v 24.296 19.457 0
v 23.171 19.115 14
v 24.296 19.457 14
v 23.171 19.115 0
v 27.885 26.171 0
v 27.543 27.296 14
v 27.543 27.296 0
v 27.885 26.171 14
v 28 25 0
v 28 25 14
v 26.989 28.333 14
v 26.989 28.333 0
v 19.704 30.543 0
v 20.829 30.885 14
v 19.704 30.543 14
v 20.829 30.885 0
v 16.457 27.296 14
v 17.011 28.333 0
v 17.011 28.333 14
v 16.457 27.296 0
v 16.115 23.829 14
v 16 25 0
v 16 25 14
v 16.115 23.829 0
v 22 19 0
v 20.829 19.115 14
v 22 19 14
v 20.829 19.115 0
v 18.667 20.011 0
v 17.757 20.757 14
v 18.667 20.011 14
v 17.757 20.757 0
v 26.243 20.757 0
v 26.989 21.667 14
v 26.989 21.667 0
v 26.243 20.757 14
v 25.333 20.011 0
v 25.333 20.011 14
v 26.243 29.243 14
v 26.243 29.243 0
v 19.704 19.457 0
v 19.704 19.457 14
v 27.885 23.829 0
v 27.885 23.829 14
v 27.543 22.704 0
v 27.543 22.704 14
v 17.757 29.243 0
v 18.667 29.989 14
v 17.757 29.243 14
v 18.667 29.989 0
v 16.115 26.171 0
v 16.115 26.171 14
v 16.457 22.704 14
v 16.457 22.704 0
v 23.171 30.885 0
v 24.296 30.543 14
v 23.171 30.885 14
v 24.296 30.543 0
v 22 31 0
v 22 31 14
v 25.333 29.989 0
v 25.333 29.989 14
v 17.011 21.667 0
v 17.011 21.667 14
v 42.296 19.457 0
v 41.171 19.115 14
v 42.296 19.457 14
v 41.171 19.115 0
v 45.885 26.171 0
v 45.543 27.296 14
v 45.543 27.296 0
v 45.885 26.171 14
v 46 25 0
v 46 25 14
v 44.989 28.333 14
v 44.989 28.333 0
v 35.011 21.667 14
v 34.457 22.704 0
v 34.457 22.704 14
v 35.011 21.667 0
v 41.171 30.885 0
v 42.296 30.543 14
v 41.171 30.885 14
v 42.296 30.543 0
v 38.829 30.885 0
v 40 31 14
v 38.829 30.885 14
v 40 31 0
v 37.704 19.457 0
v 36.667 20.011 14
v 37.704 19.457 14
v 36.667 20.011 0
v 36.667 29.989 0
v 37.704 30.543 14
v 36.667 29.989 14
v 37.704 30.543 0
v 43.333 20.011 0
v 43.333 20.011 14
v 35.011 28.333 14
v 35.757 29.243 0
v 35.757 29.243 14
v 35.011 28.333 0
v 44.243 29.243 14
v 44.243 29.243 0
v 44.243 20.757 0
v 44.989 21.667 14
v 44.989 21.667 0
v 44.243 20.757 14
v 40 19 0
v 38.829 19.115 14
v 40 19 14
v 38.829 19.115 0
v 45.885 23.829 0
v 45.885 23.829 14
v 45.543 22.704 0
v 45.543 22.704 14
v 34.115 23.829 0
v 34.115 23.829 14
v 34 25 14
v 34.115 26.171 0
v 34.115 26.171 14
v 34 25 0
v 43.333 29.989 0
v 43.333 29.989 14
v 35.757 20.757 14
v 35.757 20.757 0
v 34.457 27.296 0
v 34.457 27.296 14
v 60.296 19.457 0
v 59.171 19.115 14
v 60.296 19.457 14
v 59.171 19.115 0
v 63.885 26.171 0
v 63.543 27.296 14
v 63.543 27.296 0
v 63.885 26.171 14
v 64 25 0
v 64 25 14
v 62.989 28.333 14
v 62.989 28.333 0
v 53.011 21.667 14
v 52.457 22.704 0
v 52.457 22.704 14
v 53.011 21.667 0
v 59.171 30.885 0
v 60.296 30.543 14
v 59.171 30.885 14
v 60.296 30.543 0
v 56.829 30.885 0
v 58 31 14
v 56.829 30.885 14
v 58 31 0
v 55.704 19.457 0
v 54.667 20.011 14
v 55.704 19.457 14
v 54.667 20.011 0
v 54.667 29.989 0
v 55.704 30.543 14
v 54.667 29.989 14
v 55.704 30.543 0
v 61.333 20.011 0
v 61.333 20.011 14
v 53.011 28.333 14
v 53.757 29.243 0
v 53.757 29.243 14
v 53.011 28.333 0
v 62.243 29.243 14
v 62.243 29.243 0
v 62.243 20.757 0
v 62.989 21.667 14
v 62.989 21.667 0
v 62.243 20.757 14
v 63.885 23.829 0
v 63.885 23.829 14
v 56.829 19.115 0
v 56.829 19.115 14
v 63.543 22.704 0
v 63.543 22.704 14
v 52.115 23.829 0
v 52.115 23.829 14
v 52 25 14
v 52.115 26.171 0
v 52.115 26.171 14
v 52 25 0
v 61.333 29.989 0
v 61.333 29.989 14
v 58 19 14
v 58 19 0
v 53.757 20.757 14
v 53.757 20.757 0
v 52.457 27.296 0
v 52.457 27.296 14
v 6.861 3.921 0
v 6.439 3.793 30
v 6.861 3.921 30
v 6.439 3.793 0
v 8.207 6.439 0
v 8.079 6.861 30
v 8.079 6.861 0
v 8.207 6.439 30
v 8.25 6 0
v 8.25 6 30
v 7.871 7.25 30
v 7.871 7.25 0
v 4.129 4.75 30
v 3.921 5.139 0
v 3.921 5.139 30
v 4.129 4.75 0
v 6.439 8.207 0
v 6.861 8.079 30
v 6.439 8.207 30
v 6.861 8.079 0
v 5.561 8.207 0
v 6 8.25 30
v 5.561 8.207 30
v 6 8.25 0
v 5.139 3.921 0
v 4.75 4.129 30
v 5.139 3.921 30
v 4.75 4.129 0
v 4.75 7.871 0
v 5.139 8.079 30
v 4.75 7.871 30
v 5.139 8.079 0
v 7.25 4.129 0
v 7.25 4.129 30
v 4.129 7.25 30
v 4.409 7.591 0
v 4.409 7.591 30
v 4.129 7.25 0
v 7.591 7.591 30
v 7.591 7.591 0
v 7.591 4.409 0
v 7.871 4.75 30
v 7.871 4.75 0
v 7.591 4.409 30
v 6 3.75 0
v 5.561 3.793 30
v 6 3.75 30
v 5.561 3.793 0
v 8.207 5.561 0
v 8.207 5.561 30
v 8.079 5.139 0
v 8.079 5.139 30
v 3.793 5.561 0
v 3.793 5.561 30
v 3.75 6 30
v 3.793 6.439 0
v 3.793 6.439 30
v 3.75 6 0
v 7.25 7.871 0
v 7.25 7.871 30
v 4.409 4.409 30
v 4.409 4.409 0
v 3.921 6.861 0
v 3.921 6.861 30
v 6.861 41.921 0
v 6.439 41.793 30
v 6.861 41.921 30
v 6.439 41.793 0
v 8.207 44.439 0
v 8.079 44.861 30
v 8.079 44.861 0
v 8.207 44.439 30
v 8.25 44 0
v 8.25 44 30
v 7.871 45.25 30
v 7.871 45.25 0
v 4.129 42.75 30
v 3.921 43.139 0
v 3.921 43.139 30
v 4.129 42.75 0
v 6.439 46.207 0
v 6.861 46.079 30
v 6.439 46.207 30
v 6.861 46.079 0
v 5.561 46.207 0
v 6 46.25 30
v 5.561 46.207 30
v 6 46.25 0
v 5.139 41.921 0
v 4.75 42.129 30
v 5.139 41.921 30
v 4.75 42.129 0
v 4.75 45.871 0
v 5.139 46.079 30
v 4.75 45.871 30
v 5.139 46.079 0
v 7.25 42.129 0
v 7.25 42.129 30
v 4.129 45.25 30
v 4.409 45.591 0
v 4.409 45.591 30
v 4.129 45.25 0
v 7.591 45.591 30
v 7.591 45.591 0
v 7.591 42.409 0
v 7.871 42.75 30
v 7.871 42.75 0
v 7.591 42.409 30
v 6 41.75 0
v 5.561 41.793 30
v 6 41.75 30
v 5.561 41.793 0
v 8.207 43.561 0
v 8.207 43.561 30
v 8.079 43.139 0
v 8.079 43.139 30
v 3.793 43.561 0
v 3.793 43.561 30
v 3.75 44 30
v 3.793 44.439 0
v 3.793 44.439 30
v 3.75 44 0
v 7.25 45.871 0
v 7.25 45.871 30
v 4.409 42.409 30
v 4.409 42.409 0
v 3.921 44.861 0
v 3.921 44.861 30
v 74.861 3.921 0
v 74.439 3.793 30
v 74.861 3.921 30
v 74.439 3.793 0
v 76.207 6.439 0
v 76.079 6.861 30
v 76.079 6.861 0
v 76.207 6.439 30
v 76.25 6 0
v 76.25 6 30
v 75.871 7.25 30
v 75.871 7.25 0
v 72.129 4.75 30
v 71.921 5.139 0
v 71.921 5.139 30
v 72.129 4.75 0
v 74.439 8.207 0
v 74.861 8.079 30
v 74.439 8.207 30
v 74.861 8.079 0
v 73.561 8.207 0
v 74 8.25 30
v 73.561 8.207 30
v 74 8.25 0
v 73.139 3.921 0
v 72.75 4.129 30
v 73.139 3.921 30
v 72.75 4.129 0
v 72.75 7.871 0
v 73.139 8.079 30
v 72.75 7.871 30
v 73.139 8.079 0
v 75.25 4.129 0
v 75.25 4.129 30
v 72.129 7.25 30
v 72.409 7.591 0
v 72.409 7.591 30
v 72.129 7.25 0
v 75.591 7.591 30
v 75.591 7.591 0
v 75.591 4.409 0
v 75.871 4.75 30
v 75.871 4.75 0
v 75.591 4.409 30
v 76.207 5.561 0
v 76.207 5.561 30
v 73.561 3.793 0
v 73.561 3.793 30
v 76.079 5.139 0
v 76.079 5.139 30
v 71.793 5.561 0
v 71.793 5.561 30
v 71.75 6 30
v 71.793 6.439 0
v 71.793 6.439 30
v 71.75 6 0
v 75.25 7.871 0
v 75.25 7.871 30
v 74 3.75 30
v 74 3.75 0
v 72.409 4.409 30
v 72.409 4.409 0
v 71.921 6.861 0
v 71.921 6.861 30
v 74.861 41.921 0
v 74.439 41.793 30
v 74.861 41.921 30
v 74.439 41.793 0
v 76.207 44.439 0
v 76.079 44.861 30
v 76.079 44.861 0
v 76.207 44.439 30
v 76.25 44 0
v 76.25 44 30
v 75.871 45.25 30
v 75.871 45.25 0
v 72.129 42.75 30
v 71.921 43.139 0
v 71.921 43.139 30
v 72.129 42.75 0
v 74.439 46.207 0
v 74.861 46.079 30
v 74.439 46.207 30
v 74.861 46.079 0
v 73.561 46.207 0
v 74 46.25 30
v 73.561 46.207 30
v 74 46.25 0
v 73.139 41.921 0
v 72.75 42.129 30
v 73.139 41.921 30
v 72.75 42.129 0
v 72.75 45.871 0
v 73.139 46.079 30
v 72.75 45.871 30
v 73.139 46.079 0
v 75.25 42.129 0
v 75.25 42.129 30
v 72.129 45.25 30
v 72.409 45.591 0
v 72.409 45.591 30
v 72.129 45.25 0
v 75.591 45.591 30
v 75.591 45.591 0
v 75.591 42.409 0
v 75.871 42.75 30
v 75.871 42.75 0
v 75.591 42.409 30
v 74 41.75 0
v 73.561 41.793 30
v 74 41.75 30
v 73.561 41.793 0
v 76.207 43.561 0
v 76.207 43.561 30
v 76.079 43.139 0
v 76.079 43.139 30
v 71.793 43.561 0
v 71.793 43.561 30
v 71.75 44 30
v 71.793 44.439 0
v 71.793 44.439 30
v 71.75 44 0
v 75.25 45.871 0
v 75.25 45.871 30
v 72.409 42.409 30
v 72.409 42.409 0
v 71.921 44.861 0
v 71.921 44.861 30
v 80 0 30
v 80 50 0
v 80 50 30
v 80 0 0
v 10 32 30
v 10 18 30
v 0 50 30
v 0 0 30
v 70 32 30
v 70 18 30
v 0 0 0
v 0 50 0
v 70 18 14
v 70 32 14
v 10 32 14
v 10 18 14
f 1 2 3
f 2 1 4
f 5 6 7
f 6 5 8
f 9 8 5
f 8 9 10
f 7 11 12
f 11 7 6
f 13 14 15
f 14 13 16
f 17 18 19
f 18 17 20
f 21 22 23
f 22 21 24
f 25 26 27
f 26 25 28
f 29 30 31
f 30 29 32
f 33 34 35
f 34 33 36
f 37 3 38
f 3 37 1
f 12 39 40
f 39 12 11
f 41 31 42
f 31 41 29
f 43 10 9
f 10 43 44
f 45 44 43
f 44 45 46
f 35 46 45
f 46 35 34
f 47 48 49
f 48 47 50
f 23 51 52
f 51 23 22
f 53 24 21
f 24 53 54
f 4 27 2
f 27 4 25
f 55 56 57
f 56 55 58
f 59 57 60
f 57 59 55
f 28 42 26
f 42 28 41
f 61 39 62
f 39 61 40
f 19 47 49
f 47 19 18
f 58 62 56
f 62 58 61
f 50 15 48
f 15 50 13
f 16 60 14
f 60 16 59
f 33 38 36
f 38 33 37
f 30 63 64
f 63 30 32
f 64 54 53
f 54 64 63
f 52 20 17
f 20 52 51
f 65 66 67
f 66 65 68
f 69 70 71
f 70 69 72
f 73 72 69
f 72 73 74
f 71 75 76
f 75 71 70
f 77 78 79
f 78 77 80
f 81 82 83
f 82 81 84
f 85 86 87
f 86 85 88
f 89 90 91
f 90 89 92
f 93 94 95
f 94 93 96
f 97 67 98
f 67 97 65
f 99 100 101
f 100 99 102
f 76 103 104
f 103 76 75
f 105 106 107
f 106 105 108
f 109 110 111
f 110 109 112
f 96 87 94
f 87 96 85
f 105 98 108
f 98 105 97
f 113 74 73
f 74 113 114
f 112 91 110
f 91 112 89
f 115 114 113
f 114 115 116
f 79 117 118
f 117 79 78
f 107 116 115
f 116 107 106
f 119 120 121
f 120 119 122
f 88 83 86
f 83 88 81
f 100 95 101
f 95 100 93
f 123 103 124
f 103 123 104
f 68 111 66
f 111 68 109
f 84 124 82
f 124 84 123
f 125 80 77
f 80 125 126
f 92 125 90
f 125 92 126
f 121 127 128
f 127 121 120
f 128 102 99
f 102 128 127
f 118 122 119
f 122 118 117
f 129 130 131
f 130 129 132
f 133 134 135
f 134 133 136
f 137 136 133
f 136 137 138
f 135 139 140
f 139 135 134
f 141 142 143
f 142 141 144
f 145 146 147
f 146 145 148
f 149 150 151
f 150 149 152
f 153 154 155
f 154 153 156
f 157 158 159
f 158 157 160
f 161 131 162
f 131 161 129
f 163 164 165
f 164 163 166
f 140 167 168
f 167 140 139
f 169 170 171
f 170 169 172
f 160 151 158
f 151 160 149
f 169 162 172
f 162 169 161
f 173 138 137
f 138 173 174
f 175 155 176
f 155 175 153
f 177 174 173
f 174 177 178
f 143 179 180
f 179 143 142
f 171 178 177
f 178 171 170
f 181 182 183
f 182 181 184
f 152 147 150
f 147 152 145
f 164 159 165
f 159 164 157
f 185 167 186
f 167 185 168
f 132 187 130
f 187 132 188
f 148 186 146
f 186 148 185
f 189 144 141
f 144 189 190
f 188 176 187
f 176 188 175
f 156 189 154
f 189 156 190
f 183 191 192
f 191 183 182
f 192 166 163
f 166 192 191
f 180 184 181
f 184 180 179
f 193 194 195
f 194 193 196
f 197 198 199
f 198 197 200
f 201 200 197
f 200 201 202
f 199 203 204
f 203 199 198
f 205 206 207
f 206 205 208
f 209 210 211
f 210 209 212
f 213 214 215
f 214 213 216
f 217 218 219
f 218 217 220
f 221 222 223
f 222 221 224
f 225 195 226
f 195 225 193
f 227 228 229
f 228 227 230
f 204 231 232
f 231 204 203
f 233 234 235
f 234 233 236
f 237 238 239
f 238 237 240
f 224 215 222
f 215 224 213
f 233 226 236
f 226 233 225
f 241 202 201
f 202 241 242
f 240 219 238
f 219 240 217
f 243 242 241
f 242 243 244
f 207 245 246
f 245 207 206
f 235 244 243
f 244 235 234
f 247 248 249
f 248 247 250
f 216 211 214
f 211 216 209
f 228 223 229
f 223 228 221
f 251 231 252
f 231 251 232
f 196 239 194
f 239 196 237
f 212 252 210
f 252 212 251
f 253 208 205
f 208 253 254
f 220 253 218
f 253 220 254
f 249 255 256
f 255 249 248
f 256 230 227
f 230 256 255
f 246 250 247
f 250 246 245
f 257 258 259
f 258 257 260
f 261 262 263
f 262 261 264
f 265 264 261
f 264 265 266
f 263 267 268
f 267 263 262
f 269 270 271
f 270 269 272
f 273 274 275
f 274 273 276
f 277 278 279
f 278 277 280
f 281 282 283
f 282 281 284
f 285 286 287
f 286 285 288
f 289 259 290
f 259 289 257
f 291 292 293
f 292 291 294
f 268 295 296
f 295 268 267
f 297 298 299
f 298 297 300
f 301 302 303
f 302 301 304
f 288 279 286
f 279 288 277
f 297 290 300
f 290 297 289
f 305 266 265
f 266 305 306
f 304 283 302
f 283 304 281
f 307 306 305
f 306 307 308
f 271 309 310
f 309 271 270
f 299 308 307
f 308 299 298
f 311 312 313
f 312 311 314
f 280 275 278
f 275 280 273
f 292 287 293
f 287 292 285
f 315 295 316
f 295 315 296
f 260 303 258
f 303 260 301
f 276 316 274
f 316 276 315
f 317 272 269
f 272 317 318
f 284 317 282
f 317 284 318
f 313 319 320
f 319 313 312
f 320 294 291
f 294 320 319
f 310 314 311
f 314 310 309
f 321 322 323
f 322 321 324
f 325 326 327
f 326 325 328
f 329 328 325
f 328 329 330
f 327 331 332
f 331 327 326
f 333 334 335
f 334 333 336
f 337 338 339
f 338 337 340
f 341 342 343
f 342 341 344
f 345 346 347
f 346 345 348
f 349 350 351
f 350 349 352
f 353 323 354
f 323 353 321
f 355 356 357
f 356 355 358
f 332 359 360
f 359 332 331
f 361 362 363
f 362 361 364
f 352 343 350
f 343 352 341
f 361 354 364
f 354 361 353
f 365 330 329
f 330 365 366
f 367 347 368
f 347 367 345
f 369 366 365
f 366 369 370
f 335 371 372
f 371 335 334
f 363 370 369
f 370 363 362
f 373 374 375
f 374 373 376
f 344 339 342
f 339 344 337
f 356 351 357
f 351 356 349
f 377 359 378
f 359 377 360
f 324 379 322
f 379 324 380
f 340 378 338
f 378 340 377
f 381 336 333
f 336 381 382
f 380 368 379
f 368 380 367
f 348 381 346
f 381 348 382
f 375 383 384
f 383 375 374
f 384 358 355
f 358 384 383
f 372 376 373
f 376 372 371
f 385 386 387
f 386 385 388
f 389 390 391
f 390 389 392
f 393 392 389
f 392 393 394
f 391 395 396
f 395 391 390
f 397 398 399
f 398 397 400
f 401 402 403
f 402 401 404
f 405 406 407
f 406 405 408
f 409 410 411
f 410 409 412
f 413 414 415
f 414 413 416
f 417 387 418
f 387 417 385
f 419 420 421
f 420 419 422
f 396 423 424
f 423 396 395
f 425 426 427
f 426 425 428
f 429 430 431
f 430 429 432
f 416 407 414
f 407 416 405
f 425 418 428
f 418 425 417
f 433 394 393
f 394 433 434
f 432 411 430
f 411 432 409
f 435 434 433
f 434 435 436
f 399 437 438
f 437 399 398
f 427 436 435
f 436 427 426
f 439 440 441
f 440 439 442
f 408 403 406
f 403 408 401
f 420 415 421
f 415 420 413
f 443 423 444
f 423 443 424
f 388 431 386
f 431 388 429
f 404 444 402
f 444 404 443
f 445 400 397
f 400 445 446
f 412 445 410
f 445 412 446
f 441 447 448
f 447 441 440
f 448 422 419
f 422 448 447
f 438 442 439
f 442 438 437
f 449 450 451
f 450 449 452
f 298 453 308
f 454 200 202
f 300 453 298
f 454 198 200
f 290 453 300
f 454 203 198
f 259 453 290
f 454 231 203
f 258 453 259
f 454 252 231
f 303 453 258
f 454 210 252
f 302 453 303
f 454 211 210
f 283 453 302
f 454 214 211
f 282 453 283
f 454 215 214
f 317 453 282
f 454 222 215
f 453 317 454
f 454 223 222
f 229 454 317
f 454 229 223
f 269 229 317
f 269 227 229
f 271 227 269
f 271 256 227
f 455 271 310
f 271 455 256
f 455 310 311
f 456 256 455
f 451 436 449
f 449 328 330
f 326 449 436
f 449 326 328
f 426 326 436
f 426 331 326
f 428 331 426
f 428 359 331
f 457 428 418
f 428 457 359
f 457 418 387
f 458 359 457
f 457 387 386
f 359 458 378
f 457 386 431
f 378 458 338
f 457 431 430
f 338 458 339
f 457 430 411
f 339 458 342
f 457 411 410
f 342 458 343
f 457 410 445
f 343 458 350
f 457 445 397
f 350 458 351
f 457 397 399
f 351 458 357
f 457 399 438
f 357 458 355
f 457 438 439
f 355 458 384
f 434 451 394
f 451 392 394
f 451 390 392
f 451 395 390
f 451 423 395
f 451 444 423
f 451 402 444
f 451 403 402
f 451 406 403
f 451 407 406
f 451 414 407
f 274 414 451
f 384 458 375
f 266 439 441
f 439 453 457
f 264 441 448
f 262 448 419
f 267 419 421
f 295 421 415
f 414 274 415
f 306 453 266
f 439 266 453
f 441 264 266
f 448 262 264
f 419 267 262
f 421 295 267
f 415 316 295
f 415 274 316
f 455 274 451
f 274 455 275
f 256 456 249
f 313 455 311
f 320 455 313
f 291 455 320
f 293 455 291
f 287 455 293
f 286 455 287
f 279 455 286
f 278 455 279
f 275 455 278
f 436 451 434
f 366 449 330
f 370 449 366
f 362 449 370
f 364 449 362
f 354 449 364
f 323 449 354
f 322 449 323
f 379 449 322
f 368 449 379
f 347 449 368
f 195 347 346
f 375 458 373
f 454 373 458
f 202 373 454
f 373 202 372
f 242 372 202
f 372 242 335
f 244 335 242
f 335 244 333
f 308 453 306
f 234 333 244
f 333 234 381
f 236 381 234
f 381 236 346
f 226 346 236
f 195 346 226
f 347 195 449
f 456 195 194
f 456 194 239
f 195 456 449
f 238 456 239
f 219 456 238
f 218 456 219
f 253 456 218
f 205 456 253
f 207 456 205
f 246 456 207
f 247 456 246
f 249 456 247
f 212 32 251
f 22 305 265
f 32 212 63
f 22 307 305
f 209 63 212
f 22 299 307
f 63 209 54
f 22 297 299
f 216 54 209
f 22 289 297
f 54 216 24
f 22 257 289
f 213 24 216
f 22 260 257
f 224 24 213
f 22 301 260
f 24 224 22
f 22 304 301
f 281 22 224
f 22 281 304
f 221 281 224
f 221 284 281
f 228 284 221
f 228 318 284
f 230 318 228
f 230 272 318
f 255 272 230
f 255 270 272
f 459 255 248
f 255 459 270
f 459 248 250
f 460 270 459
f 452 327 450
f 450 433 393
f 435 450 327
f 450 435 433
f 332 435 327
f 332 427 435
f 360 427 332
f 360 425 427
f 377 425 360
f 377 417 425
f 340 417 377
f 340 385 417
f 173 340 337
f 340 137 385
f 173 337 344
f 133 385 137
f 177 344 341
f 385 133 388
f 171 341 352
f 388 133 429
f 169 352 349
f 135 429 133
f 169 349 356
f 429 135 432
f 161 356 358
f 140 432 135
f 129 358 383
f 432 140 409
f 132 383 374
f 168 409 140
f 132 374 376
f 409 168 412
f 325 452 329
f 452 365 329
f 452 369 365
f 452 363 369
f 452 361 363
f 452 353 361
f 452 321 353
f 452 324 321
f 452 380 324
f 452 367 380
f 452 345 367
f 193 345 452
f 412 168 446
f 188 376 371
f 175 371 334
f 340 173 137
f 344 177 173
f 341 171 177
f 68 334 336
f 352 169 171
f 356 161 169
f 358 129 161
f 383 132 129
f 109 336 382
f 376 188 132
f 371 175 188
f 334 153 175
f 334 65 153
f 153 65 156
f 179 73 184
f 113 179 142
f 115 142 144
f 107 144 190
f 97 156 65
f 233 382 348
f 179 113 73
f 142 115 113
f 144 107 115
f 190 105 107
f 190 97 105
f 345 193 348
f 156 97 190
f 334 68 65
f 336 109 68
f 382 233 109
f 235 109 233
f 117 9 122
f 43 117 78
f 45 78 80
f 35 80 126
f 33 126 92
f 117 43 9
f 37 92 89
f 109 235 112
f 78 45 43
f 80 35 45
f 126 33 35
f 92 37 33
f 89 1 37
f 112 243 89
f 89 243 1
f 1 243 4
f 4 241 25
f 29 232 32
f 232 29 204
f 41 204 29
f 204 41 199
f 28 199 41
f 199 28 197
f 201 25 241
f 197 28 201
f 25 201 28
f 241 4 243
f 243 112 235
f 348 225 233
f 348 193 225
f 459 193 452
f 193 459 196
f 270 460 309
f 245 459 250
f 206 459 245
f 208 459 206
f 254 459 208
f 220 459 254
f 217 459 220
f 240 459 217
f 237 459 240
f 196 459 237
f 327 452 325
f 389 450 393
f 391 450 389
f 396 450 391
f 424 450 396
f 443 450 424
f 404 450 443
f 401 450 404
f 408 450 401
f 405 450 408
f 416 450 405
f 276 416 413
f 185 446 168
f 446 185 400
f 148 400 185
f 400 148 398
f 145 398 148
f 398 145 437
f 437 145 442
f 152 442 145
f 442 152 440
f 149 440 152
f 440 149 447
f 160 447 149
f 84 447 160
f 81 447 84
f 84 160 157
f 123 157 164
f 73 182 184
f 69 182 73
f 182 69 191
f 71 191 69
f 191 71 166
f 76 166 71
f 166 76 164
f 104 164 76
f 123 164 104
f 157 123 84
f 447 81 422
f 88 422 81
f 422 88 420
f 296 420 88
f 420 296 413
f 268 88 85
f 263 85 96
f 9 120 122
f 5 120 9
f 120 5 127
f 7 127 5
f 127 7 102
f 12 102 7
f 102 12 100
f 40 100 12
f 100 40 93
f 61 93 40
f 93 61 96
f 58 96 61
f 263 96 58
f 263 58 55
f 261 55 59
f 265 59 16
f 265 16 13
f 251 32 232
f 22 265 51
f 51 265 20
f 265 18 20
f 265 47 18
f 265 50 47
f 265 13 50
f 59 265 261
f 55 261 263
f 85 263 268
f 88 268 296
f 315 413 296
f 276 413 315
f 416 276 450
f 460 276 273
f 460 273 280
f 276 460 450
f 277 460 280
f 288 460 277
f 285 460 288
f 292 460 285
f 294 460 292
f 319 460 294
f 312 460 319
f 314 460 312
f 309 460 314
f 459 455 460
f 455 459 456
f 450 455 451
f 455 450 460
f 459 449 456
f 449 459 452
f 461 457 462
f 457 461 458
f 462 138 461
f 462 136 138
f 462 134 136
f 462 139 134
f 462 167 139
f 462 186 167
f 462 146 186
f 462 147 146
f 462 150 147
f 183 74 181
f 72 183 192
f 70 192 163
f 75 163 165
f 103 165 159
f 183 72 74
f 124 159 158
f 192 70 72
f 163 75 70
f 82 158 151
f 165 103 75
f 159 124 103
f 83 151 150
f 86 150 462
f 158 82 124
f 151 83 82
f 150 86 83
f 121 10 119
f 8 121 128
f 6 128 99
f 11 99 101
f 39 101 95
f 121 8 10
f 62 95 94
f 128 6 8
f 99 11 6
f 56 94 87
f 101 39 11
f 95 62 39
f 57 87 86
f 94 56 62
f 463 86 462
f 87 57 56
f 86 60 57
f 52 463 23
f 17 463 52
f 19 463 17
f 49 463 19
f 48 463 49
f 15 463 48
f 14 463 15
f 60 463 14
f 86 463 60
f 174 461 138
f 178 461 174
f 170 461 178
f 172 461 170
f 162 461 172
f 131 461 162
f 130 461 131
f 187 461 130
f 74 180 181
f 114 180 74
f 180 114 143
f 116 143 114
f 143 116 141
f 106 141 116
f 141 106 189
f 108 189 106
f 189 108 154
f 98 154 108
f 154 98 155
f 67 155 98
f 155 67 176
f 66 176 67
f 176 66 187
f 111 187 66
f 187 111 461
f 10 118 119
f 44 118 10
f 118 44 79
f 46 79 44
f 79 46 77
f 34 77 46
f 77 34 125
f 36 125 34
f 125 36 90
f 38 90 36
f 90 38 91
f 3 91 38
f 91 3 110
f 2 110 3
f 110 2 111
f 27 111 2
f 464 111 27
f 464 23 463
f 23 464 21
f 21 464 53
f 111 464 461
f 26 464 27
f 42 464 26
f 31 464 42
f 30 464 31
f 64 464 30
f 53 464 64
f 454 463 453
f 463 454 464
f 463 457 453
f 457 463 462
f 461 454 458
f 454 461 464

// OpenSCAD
$fn = 32;

// ----------------------------------------------------------------------
// Manifold block: gallery_top manifold
// ----------------------------------------------------------------------

// --- parameters (mm) ---
block_l = 80;             // block length, X
block_w = 50;             // block width, Y
block_h = 30;             // block height, Z
port_d = 12;              // port bore diameter
port_pitch = 18;          // port pitch along X
gallery_d = 14;           // top gallery width, Y
gallery_depth = 16;       // gallery pocket depth
wall_p = 10;              // gallery end wall thickness, X
mnt_d = 4.5;              // mounting hole diameter
mnt_in = 6;               // mounting hole inset from the edges

n_ports = 3;  // ports in the row
port_x0 = (block_l - (n_ports - 1) * port_pitch) / 2;  // first port X

difference() {
  cube([block_l, block_w, block_h]);
  for (i = [0 : n_ports - 1])
    translate([port_x0 + i * port_pitch, block_w / 2, -1])
      cylinder(h = block_h + 2, d = port_d);
  translate([wall_p, block_w / 2 - gallery_d / 2, block_h - gallery_depth])
    cube([block_l - 2 * wall_p, gallery_d, gallery_depth + 1]);
  for (cx = [mnt_in, block_l - mnt_in])
    for (cy = [mnt_in, block_w - mnt_in])
      translate([cx, cy, -1]) cylinder(h = block_h + 2, d = mnt_d);
}
